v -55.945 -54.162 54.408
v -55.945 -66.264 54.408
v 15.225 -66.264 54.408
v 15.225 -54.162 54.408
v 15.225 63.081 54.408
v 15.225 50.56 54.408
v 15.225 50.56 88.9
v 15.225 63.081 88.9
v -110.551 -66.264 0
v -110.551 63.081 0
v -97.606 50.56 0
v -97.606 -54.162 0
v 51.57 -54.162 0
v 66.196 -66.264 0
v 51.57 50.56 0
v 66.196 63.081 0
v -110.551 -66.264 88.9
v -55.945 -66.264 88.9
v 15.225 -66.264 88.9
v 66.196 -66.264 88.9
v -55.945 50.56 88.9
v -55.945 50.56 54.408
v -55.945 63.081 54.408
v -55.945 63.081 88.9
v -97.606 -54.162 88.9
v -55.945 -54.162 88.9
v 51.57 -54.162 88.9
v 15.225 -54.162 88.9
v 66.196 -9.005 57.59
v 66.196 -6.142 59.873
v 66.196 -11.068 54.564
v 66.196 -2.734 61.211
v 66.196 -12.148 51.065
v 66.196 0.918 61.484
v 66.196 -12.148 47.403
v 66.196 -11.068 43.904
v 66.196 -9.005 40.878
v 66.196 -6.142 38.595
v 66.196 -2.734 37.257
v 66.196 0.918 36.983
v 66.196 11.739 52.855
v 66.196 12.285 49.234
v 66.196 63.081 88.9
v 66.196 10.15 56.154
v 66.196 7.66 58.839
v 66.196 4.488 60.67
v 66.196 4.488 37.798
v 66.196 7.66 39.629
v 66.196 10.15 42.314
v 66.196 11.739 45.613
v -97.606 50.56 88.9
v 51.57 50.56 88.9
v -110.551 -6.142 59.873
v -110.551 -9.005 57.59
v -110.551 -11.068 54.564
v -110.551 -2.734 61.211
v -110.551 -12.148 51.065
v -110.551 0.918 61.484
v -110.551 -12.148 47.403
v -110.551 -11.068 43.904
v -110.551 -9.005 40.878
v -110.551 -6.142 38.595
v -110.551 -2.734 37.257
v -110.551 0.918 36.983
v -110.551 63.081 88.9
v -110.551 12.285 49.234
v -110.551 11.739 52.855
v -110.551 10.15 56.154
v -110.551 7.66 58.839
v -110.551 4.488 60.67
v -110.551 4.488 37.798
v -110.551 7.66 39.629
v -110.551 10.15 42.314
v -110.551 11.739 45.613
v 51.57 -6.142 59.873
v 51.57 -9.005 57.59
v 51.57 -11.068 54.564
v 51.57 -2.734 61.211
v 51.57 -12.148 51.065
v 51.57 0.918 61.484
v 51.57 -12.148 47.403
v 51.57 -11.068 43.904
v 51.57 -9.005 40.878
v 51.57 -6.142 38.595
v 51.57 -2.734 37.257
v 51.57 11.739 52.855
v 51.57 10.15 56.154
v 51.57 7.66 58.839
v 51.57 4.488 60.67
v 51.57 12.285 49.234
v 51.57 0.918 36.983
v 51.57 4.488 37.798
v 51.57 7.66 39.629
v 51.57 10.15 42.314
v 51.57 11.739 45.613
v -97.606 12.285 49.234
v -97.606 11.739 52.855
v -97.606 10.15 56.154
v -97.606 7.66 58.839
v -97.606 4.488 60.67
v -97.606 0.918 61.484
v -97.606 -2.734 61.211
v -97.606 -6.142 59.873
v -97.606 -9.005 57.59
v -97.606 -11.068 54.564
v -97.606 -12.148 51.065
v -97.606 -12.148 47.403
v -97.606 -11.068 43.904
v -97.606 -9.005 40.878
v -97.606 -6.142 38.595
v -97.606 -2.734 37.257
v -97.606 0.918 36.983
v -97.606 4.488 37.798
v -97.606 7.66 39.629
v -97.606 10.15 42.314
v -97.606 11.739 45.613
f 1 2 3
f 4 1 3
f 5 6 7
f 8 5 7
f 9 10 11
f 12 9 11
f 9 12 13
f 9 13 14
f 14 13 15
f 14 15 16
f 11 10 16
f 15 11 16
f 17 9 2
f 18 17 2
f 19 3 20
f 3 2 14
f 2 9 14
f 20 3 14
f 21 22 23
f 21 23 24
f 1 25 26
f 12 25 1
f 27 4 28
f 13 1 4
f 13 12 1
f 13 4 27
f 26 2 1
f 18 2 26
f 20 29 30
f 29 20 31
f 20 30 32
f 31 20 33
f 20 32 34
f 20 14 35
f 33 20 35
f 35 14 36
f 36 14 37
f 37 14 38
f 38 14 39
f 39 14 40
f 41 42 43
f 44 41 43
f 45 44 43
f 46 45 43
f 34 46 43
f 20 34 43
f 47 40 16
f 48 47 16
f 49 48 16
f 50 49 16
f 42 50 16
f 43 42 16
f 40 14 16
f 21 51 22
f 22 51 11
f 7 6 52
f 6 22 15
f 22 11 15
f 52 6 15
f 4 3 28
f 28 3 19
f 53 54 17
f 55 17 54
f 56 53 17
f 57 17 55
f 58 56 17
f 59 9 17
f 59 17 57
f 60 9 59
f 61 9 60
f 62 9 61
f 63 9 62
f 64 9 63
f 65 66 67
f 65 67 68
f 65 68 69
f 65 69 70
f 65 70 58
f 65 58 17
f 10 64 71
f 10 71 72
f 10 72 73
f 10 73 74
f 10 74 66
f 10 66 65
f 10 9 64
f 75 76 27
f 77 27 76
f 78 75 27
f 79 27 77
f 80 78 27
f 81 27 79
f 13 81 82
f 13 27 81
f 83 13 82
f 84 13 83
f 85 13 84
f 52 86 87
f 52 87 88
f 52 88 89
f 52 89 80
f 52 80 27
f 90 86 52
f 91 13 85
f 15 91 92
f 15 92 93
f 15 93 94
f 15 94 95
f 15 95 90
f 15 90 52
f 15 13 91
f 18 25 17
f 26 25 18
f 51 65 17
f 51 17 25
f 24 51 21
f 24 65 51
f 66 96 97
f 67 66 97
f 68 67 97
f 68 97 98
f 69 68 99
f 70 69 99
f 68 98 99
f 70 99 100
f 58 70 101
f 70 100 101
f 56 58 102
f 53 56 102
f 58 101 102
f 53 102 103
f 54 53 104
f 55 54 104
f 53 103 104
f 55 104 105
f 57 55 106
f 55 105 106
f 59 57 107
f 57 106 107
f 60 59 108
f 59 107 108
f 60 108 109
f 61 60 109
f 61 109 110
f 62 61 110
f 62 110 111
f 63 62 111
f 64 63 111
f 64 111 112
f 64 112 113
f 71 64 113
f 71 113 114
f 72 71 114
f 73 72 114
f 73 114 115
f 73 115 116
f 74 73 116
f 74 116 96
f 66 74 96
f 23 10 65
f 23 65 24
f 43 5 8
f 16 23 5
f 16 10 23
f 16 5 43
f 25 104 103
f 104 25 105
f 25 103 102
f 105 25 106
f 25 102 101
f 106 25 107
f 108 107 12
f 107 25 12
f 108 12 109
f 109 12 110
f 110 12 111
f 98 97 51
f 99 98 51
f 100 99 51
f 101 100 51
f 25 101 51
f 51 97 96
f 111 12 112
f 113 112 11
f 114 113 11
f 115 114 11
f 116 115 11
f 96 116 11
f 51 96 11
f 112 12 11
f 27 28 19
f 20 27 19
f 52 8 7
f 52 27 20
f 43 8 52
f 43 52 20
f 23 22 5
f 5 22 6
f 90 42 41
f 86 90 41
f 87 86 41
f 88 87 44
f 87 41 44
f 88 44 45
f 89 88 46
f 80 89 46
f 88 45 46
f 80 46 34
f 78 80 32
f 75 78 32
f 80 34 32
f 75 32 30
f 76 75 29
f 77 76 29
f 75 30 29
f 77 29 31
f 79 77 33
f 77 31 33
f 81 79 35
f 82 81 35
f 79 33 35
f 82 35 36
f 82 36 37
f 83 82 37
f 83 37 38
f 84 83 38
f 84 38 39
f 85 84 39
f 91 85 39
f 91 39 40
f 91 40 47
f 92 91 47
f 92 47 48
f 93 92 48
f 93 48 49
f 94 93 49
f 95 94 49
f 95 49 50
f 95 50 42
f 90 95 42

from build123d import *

# Parameters (mm, degrees)
F0_W     = 176.7475008965
F0_H     = 129.3457597494
F0_W_2   = 149.1751894355
F0_H_2   = 104.7213375568
F1_DEPTH = 88.9
F2_W     = 71.169947274
F2_H     = 34.491557771
F3_DEPTH = 152.4
F4_R     = 12.2849122759
F5_DEPTH = 254


with BuildPart() as f1:
    # F0 (on Top) → F1 (new body)
    with BuildSketch(Plane.XY):
        with Locations((-22.1776217222, -1.5915185213)):
            Rectangle(F0_W, F0_H)
        with Locations((-23.0179391801, -1.8009990454)):
            Rectangle(F0_W_2, F0_H_2, mode=Mode.SUBTRACT)
    extrude(amount=F1_DEPTH)

    # F2 (on face) → F3 (cut)
    with BuildSketch(Plane.XZ.offset(66.264398396)):
        with Locations((-20.3596032225, 71.6542211145)):
            Rectangle(F2_W, F2_H)
    extrude(amount=-F3_DEPTH, mode=Mode.SUBTRACT)

    # F4 (on face) → F5 (cut)
    with BuildSketch(Plane.YZ.offset(66.196128726)):
        with Locations((0, 49.2339283228)):
            Circle(F4_R)
    extrude(amount=-F5_DEPTH, mode=Mode.SUBTRACT)


solid = f1.part
